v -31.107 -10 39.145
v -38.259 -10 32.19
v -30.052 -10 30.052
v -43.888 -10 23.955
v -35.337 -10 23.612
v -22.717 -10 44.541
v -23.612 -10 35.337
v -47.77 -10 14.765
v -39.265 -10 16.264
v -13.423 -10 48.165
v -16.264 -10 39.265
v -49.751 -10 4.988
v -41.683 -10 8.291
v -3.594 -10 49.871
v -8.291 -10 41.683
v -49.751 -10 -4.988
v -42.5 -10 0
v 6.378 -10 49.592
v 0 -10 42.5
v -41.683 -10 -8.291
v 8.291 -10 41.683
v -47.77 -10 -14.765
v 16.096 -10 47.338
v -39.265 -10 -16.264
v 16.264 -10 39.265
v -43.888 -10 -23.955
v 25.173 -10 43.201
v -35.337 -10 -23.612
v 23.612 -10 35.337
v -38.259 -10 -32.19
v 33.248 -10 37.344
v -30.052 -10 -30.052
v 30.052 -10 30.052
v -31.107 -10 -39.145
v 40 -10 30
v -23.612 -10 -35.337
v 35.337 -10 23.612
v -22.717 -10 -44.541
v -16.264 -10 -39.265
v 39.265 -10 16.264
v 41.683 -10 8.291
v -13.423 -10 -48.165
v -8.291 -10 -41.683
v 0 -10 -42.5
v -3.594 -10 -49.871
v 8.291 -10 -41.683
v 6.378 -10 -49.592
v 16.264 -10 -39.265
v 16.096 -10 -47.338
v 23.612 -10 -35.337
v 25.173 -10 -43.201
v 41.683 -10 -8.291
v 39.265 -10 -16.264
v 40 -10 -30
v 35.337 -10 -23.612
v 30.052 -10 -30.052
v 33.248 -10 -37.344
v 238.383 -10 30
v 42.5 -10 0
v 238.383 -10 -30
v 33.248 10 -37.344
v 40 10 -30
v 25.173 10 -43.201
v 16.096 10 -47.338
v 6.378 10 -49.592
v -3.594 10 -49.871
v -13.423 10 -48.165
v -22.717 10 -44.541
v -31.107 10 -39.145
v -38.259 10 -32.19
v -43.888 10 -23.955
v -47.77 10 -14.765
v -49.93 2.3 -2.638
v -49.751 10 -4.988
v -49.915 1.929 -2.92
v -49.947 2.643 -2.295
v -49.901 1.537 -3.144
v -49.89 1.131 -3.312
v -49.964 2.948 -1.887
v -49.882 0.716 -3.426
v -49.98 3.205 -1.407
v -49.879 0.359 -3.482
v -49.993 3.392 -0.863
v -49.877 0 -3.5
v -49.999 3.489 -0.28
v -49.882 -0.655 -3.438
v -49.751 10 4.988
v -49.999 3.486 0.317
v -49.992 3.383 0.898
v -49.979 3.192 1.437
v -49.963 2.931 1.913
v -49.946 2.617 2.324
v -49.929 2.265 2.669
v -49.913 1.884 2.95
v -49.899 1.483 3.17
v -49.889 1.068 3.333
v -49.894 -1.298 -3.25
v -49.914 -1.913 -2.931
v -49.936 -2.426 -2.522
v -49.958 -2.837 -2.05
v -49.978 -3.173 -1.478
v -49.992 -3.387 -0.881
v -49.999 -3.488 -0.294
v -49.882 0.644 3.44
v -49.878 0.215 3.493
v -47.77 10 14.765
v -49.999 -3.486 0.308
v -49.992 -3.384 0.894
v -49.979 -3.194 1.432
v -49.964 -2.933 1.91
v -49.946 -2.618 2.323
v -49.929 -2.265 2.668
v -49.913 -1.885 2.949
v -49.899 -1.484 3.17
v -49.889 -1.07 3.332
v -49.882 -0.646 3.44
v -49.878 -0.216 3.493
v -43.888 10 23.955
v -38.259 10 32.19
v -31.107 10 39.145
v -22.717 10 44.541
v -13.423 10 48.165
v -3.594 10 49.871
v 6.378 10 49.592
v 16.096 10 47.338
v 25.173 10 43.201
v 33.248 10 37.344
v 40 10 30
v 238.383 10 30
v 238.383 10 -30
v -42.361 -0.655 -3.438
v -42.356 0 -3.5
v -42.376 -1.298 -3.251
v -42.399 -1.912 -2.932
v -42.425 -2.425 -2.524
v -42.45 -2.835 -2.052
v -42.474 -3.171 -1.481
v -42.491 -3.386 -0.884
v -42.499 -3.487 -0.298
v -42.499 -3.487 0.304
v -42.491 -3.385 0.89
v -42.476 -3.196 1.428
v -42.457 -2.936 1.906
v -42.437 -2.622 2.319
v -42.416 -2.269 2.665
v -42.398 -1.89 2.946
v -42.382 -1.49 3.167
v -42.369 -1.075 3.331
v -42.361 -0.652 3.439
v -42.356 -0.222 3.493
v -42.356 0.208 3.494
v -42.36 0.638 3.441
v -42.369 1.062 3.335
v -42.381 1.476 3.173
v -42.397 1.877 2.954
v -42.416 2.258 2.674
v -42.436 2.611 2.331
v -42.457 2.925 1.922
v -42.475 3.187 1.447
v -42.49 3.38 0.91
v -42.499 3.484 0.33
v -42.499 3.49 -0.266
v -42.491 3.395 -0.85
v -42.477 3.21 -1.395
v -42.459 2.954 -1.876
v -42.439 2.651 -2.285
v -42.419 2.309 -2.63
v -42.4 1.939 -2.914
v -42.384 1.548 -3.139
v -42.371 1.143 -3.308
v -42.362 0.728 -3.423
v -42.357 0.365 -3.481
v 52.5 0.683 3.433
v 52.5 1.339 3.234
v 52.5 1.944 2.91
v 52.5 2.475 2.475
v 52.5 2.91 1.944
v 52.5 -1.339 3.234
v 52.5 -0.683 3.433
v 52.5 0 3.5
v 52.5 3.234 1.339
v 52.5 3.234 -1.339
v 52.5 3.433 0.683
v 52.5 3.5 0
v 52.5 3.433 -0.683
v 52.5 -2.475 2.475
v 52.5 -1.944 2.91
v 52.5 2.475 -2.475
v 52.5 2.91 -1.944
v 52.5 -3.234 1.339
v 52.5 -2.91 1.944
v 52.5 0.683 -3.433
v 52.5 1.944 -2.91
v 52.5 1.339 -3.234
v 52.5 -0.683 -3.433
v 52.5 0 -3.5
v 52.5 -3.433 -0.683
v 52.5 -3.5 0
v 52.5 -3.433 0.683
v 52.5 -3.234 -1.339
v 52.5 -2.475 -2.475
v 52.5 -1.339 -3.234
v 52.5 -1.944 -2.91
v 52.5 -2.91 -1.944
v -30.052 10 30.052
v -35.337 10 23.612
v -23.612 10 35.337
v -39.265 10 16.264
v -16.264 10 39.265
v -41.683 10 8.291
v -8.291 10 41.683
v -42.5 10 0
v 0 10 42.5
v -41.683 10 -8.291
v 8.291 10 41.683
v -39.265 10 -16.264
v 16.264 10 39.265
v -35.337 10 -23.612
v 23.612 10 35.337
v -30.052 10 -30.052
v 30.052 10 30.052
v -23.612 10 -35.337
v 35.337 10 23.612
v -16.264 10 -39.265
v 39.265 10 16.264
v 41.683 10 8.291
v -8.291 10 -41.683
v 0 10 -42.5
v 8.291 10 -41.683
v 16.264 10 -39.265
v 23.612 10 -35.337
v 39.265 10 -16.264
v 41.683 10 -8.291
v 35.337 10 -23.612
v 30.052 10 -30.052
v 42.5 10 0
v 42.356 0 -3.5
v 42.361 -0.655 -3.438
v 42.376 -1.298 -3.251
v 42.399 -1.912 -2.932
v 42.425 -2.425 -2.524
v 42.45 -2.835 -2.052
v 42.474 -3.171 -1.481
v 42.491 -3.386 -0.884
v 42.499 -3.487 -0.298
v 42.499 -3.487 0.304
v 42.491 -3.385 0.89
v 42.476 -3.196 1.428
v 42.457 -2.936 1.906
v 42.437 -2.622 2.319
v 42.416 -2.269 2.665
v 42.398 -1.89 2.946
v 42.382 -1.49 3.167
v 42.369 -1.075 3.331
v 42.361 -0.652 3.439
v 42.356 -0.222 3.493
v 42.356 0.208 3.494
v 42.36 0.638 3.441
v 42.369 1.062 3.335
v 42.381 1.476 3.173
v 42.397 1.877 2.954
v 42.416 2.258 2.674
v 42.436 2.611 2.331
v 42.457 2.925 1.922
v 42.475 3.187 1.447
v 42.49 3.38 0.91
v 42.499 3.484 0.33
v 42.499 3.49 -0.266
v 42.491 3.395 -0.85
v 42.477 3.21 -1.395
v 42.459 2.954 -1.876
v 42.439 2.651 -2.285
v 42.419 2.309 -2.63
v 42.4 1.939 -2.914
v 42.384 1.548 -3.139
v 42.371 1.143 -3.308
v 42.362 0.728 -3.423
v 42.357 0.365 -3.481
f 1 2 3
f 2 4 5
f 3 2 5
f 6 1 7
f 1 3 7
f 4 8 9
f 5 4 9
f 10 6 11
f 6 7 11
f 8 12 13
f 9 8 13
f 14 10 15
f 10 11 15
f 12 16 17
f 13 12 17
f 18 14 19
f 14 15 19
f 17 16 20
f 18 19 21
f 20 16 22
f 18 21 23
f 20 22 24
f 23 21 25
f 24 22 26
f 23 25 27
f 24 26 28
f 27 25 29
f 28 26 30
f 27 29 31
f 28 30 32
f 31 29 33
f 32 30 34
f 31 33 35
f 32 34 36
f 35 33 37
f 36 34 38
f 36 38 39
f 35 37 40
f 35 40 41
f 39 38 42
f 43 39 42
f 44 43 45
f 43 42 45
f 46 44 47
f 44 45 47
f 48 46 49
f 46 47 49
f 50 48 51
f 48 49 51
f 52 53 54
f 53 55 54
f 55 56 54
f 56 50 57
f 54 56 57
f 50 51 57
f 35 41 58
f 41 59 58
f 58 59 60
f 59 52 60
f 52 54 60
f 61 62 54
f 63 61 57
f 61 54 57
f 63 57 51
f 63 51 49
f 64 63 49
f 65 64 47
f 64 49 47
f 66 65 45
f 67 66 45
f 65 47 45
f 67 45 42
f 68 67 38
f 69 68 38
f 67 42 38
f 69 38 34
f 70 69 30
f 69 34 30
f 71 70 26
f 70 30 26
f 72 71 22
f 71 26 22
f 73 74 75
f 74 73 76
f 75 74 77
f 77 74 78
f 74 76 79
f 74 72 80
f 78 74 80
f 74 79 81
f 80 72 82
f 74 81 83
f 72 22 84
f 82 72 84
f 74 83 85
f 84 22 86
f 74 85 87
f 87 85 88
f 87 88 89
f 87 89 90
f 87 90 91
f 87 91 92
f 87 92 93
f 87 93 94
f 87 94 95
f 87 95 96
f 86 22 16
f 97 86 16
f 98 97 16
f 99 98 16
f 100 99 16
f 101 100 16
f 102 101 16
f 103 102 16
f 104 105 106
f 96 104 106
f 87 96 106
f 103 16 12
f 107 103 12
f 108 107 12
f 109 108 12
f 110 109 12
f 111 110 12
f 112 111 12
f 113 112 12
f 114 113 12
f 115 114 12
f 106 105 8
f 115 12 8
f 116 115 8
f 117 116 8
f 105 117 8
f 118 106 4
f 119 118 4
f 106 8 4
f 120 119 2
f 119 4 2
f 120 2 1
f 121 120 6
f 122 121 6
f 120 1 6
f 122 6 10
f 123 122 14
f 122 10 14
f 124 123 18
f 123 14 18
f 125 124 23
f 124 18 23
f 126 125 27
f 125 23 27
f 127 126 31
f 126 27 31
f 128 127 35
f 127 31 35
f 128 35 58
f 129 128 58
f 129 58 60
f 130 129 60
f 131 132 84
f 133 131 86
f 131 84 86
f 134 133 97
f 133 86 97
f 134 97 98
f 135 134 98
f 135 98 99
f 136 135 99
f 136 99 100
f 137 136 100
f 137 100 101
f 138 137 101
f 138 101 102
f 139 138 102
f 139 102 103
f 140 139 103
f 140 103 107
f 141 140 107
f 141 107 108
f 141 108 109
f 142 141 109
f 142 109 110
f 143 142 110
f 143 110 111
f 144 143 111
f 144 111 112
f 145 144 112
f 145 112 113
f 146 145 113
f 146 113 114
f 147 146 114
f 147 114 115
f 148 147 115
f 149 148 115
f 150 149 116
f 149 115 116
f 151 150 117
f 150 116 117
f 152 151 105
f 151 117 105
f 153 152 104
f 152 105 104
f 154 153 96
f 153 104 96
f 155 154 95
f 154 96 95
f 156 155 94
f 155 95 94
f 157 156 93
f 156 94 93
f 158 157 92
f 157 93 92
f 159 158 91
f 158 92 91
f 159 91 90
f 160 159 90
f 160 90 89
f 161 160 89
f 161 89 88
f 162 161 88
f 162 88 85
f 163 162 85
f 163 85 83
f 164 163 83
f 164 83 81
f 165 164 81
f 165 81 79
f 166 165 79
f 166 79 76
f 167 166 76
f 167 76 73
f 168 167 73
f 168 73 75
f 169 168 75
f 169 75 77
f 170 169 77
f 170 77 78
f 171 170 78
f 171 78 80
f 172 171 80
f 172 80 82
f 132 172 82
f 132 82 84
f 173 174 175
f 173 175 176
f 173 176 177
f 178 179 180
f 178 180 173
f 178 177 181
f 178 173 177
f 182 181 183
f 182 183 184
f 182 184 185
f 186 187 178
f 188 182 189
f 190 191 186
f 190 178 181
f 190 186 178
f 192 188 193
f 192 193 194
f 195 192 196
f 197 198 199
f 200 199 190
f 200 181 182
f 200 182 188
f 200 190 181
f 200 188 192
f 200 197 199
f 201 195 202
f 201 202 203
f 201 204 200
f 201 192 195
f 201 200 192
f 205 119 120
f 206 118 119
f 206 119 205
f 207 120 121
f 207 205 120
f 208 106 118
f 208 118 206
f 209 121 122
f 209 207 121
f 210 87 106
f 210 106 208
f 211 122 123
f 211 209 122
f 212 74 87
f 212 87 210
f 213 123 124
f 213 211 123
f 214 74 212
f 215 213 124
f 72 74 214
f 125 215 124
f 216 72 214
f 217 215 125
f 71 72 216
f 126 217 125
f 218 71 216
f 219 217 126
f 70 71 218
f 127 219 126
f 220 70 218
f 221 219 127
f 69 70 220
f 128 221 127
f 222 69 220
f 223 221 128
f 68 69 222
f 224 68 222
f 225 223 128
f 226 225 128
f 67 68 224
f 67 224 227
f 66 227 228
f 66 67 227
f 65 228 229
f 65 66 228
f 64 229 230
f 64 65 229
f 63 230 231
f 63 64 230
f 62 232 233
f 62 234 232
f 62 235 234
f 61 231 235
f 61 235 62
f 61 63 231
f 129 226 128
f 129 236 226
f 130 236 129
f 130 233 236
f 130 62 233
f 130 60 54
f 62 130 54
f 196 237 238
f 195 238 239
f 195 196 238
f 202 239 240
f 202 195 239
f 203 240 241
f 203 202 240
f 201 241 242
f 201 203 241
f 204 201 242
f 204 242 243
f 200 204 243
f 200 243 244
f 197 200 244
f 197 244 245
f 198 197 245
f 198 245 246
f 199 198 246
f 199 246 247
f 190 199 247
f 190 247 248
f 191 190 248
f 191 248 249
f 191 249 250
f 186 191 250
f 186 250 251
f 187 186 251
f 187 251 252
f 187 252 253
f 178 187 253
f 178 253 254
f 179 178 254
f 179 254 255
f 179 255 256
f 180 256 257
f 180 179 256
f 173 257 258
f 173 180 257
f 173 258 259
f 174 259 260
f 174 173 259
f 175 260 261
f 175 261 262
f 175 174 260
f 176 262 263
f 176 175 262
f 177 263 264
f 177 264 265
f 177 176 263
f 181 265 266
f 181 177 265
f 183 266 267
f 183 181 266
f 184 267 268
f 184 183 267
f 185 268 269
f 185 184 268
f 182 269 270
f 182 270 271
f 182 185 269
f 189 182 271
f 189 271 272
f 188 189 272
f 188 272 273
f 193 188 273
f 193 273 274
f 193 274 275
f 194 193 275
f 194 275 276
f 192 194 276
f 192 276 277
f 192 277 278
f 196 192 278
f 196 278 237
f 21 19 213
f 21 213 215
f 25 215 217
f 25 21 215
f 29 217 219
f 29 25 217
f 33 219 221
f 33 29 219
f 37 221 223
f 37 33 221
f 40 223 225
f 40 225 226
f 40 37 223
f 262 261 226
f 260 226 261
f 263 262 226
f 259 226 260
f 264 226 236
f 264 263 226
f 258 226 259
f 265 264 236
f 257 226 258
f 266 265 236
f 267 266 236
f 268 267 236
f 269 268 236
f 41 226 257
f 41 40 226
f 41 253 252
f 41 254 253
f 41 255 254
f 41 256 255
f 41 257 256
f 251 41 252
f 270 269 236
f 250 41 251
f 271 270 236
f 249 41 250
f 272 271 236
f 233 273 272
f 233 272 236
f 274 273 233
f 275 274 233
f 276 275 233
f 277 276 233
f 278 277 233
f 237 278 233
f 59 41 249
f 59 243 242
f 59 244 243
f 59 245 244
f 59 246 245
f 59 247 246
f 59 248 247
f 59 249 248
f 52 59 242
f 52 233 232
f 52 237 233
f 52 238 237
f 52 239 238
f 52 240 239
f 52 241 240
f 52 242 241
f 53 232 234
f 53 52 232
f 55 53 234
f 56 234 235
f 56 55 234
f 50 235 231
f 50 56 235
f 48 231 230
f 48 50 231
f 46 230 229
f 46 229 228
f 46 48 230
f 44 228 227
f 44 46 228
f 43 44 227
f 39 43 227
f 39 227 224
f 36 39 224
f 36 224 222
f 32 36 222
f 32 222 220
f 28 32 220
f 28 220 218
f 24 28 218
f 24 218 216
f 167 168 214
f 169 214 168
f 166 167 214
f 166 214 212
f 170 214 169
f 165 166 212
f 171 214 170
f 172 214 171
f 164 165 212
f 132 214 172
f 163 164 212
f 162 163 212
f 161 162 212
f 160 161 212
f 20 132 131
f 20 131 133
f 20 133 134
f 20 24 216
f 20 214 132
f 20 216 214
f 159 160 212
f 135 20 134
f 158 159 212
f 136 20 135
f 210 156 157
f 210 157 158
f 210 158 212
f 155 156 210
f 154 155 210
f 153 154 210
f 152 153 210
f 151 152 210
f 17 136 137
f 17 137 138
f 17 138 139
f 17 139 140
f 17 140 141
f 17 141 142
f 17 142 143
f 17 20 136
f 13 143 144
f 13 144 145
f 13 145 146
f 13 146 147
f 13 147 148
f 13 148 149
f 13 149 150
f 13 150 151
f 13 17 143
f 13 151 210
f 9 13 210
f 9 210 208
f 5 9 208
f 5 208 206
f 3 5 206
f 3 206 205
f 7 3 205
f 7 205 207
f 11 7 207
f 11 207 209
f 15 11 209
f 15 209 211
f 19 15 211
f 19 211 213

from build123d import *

# Parameters (mm, degrees)
BOSS_EXTRUDE1_DEPTH      = 10
BOSS_EXTRUDE1_DEPTH_BACK = 10
SKETCH1_R                = 42.5
CUT_EXTRUDE6_REACH       = 194.75
CUT_EXTRUDE6_END_RADIUS  = 42.5
SKETCH3_R                = 3.5


with BuildPart() as part:
    # Sketch1 → Boss-Extrude1 (new, two sides: drawn at the far end of the back side and taken through both)
    with BuildSketch(Plane(origin=(0, 0, 0), x_dir=(1, 0, 0), z_dir=(0, 1, 0)).offset(-BOSS_EXTRUDE1_DEPTH_BACK)):
        with BuildLine():
            ThreePointArc((40, 30), (-50, 0), (40, -30))
            Line((40, -30), (238.383087675, -30))
            Line((238.383087675, -30), (238.383087675, 30))
            Line((238.383087675, 30), (40, 30))
        make_face()
        Circle(SKETCH1_R, mode=Mode.SUBTRACT)
    extrude(amount=BOSS_EXTRUDE1_DEPTH + BOSS_EXTRUDE1_DEPTH_BACK)

    # Cut-Extrude6: up to this cylinder (the profile starts outside it)
    cut_extrude6_end = Plane(origin=(0, 0, 0), z_dir=(0, 1, 0)) * Cylinder(CUT_EXTRUDE6_END_RADIUS, 475.5, mode=Mode.PRIVATE)
    # Sketch3 → Cut-Extrude6 (cut, up to the surface)
    with BuildSketch(Plane.ZY.offset(-52.5), mode=Mode.PRIVATE) as cut_extrude6_sk1:
        Circle(SKETCH3_R)
    cut_extrude6_tool1 = extrude(cut_extrude6_sk1.sketch, amount=CUT_EXTRUDE6_REACH, mode=Mode.PRIVATE) - cut_extrude6_end
    cut_extrude6 = cut_extrude6_tool1.solids().sort_by_distance((52.5, 0, 0))[0]
    add(cut_extrude6, mode=Mode.SUBTRACT)

    # Mirror1: Cut-Extrude6 across plane
    add(cut_extrude6.mirror(Plane(origin=(0, 0, 0), x_dir=(0, 0, 1), z_dir=(1, 0, 0))), mode=Mode.SUBTRACT)


solid = part.part
